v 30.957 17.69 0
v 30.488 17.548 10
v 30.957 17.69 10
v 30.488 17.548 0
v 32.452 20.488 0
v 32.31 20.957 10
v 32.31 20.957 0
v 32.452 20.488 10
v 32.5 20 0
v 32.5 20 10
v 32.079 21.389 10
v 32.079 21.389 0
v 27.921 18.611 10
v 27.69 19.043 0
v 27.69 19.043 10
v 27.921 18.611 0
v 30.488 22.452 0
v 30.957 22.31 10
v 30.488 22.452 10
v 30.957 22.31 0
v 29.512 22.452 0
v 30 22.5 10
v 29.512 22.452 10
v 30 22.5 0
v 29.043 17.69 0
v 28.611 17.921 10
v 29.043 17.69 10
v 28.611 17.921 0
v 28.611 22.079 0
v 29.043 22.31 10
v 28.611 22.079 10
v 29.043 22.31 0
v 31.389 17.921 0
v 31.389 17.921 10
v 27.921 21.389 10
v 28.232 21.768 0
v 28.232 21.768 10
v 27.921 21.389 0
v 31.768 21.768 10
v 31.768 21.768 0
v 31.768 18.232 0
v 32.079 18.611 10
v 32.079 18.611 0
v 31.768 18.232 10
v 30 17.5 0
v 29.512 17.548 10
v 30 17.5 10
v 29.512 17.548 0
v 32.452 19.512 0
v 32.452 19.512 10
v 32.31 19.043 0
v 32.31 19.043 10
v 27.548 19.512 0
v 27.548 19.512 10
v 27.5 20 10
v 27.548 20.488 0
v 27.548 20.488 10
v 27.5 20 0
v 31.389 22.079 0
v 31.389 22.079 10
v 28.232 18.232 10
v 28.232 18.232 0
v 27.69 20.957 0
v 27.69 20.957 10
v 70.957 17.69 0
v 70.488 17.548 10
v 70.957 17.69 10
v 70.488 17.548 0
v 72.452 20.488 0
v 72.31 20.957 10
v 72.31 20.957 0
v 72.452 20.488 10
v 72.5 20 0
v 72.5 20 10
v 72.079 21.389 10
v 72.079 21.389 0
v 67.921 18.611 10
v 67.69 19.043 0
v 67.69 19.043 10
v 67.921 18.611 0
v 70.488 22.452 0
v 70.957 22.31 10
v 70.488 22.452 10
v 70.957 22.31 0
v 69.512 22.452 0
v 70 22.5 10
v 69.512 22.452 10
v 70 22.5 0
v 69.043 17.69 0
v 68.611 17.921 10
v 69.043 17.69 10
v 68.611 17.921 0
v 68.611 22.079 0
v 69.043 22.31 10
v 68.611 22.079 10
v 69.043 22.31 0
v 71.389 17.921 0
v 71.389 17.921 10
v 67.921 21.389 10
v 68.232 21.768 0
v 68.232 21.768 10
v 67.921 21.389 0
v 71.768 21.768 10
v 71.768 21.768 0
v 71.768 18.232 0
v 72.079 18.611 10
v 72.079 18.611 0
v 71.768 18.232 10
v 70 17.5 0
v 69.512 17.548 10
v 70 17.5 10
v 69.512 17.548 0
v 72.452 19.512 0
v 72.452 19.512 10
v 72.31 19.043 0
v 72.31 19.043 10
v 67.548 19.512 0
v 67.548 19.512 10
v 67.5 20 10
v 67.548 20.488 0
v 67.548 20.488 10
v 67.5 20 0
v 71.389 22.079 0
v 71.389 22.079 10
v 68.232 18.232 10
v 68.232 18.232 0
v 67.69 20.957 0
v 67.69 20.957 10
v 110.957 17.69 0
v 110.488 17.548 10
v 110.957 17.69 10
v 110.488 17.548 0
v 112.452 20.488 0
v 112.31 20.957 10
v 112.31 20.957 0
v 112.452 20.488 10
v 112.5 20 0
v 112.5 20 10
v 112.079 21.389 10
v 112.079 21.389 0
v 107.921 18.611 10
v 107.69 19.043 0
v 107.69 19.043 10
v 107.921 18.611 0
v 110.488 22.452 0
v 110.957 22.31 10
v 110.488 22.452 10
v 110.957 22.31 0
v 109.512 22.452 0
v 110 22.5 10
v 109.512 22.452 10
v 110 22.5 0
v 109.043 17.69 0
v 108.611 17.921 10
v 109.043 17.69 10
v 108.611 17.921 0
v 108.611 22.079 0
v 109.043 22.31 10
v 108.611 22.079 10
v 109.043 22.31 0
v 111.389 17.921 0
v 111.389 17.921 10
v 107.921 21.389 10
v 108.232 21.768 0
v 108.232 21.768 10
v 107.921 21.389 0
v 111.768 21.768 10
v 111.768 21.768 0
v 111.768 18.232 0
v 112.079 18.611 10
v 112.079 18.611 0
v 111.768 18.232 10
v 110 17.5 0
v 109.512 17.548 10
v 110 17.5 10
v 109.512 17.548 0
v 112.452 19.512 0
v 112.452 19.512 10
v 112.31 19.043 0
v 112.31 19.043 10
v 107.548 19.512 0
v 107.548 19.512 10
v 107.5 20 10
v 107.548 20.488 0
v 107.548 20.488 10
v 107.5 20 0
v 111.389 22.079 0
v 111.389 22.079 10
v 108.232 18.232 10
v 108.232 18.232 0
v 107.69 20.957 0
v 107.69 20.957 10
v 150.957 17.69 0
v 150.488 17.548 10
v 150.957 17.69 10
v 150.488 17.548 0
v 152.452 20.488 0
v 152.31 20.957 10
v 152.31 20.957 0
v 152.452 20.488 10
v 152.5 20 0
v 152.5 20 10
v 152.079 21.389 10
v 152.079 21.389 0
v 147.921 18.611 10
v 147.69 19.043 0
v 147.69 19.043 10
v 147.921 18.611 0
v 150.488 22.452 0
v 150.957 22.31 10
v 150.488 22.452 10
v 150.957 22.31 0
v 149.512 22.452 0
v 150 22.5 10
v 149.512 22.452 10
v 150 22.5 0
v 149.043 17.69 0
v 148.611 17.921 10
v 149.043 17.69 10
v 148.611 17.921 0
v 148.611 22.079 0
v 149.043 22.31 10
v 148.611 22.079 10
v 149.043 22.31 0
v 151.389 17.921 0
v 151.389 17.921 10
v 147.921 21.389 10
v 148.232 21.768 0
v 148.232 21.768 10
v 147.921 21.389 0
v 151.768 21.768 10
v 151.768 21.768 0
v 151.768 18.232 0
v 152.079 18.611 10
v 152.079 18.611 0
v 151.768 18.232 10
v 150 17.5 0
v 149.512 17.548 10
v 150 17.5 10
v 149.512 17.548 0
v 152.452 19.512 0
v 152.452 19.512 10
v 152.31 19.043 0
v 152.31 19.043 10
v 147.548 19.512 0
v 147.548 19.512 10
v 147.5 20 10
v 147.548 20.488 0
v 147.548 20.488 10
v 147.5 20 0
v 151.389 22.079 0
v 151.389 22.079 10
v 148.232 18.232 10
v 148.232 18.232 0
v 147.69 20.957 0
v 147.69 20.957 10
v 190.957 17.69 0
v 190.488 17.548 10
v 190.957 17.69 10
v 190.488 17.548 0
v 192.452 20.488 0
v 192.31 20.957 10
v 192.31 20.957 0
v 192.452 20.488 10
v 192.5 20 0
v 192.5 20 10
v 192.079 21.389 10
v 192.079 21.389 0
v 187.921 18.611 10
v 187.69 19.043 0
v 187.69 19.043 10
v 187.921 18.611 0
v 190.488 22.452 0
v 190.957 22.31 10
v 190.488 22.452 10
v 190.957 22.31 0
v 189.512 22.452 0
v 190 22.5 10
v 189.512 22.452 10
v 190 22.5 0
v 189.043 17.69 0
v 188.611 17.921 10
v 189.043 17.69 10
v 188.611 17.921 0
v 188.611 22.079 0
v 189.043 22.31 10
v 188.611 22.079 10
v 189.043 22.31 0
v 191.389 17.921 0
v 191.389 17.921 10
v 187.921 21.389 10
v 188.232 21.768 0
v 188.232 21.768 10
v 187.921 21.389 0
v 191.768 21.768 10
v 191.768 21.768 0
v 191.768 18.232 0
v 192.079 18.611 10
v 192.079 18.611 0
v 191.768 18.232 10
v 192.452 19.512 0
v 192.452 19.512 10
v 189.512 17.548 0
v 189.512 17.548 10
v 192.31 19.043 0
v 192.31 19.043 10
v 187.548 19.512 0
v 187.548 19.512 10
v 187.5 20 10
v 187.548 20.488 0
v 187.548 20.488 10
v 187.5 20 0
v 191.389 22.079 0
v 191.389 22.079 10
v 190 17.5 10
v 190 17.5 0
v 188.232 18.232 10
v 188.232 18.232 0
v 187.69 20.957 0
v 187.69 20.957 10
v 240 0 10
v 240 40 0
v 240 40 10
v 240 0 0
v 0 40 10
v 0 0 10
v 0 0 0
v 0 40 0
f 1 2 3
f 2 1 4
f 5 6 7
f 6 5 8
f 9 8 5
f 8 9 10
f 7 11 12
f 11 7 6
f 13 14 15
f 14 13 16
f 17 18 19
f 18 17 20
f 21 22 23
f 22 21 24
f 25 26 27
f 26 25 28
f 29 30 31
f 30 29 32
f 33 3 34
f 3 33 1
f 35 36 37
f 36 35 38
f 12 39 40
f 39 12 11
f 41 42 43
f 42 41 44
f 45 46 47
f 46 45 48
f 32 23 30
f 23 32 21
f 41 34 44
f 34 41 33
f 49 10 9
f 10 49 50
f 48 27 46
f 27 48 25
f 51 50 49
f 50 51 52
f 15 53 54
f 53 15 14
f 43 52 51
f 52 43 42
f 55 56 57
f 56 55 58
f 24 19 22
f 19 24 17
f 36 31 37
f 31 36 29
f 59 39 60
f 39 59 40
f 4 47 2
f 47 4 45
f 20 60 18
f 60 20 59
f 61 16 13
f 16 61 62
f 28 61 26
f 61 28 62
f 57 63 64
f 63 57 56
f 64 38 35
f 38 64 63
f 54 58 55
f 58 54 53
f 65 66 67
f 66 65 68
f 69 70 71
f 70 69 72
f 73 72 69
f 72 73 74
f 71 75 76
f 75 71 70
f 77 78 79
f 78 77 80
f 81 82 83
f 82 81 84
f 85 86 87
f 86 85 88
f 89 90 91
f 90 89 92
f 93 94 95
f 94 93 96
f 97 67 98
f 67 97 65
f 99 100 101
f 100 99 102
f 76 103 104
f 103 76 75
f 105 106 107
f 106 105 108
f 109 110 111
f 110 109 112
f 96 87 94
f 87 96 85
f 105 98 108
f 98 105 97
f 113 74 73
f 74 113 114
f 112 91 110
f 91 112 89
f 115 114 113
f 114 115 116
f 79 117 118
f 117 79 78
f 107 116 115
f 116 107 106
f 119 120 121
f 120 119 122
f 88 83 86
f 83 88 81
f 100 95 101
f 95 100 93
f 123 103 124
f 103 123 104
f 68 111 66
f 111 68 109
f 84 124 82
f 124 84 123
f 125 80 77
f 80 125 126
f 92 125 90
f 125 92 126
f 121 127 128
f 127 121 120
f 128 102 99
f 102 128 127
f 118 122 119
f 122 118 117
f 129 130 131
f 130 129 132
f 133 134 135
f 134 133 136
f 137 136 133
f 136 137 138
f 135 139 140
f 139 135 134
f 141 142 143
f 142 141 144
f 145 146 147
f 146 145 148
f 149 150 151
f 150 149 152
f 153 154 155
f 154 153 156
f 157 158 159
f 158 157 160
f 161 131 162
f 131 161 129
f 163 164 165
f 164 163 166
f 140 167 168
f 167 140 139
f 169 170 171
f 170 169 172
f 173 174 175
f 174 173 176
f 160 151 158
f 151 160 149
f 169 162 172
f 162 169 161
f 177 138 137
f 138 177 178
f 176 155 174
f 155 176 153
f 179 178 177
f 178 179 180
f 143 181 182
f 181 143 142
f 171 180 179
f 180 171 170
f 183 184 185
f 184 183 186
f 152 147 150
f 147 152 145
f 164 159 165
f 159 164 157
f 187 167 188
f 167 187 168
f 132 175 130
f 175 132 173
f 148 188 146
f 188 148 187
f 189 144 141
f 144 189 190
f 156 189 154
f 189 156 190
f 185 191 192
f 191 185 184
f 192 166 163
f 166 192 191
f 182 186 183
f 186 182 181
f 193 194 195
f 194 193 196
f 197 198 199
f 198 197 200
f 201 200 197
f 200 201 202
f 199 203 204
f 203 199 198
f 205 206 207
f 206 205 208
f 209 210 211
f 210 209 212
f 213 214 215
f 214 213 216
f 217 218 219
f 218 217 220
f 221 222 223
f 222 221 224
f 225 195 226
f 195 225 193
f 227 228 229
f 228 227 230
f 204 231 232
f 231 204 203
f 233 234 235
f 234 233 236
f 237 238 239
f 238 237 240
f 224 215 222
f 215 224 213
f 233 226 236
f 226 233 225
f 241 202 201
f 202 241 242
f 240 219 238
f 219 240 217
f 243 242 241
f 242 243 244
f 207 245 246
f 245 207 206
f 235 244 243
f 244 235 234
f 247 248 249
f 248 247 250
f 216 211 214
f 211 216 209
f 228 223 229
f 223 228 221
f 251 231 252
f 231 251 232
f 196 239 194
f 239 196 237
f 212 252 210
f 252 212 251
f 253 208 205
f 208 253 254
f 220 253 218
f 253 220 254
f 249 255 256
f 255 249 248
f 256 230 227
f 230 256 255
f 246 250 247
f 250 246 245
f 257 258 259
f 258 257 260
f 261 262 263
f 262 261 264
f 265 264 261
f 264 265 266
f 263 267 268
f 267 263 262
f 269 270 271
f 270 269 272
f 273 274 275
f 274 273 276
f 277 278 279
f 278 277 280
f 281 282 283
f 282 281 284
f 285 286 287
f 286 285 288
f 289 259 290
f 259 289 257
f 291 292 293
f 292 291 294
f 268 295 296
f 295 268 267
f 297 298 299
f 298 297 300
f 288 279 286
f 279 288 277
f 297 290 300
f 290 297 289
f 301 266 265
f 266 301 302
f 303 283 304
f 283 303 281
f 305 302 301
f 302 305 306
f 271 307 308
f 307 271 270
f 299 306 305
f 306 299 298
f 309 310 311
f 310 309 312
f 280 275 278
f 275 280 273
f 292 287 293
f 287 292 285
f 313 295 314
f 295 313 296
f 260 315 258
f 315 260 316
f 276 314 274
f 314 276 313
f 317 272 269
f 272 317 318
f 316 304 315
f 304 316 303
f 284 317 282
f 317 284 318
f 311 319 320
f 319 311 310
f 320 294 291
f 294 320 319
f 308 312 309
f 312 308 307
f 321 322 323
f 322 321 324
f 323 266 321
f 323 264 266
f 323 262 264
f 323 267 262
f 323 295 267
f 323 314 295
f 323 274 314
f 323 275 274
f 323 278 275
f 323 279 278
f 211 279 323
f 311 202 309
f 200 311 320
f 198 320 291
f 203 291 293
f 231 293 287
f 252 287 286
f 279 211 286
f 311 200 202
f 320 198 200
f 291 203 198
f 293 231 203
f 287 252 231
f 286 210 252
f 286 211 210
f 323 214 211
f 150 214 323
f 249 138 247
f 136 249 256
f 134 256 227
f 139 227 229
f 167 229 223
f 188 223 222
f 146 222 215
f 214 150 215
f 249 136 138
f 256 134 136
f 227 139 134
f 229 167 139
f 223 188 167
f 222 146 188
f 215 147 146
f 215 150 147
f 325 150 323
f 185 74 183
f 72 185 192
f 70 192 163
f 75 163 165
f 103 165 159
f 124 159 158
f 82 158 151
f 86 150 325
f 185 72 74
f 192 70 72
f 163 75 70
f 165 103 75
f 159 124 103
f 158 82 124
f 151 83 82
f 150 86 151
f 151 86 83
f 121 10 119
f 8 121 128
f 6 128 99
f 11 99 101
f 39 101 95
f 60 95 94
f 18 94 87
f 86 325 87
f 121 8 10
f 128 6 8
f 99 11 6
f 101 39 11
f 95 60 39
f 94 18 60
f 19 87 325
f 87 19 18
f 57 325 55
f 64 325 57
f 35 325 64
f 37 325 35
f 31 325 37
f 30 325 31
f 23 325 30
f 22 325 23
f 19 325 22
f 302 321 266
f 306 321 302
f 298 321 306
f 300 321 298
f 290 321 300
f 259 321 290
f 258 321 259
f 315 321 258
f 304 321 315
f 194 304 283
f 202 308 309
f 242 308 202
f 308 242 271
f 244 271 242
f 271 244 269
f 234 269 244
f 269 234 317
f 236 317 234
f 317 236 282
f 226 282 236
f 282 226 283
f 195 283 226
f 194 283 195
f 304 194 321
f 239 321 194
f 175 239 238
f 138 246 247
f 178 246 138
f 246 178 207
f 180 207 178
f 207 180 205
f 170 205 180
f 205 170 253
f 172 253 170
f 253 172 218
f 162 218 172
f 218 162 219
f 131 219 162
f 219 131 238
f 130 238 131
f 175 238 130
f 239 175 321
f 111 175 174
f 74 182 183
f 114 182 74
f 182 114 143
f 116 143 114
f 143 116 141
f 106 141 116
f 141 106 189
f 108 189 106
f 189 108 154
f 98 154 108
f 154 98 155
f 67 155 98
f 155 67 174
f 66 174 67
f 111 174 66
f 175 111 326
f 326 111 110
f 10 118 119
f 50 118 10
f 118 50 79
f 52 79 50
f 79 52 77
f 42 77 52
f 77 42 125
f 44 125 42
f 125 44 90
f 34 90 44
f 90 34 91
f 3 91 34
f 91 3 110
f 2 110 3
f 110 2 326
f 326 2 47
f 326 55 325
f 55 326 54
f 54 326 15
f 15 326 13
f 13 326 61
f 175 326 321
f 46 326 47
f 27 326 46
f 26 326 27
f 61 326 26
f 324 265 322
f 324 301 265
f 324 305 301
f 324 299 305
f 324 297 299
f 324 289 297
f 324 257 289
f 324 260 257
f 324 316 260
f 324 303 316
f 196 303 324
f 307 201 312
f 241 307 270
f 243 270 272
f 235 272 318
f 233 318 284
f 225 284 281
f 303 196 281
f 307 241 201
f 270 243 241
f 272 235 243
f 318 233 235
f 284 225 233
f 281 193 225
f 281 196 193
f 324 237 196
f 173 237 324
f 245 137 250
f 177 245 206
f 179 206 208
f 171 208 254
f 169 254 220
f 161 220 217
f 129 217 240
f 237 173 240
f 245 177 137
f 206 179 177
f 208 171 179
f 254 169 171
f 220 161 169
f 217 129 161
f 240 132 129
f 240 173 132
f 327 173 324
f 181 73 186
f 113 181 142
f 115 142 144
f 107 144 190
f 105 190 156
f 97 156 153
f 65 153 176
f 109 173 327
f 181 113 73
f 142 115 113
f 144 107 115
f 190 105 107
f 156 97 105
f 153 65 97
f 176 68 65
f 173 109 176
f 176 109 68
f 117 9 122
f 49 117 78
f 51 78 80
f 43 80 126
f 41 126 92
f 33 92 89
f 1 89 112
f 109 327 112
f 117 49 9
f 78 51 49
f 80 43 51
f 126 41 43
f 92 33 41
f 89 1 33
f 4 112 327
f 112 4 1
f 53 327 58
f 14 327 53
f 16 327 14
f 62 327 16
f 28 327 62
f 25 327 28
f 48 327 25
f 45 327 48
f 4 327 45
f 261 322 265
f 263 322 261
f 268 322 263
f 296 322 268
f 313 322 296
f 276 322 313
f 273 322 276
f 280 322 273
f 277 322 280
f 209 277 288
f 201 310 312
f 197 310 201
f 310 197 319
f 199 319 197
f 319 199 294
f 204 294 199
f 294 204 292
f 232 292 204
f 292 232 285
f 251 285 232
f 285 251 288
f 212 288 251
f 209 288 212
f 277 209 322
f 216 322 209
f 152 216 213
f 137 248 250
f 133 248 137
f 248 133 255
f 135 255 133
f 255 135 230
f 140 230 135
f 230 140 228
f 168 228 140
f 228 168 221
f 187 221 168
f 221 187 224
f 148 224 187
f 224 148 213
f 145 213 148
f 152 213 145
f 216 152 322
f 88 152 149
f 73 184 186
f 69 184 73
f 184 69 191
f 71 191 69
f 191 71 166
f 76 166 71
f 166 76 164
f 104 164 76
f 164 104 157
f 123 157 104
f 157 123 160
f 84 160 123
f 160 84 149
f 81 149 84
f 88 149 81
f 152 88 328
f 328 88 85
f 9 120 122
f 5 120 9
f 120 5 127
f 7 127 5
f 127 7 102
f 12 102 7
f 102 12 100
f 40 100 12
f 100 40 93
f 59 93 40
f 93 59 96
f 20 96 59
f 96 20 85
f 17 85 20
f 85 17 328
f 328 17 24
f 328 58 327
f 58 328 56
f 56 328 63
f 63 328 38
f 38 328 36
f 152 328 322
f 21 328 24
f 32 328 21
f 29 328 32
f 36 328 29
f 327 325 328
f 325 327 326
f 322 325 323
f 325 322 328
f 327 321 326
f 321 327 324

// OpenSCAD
$fn = 32;

// ----------------------------------------------------------------------
// Long rail: 200-250 mm mounting rail
// ----------------------------------------------------------------------

// --- parameters (mm) ---
rail_l = 240;             // rail length, X
rail_w = 40;              // rail width, Y
rail_t = 10;              // rail thickness, Z
hole_d = 5;               // mounting hole diameter
hole_start = 30;          // first hole offset from the end
hole_pitch = 40;          // hole pitch
holes = 5;                // number of holes
fit_tol = 0.02;           // tolerance for press fits, mm
free_tol = 0.2;           // tolerance for clearance fits, mm

difference() {
  cube([rail_l, rail_w, rail_t]);
  for (i = [0 : holes - 1])
    translate([hole_start + i * hole_pitch, rail_w / 2, -1])
      cylinder(h = rail_t + 2, d = hole_d);
}
